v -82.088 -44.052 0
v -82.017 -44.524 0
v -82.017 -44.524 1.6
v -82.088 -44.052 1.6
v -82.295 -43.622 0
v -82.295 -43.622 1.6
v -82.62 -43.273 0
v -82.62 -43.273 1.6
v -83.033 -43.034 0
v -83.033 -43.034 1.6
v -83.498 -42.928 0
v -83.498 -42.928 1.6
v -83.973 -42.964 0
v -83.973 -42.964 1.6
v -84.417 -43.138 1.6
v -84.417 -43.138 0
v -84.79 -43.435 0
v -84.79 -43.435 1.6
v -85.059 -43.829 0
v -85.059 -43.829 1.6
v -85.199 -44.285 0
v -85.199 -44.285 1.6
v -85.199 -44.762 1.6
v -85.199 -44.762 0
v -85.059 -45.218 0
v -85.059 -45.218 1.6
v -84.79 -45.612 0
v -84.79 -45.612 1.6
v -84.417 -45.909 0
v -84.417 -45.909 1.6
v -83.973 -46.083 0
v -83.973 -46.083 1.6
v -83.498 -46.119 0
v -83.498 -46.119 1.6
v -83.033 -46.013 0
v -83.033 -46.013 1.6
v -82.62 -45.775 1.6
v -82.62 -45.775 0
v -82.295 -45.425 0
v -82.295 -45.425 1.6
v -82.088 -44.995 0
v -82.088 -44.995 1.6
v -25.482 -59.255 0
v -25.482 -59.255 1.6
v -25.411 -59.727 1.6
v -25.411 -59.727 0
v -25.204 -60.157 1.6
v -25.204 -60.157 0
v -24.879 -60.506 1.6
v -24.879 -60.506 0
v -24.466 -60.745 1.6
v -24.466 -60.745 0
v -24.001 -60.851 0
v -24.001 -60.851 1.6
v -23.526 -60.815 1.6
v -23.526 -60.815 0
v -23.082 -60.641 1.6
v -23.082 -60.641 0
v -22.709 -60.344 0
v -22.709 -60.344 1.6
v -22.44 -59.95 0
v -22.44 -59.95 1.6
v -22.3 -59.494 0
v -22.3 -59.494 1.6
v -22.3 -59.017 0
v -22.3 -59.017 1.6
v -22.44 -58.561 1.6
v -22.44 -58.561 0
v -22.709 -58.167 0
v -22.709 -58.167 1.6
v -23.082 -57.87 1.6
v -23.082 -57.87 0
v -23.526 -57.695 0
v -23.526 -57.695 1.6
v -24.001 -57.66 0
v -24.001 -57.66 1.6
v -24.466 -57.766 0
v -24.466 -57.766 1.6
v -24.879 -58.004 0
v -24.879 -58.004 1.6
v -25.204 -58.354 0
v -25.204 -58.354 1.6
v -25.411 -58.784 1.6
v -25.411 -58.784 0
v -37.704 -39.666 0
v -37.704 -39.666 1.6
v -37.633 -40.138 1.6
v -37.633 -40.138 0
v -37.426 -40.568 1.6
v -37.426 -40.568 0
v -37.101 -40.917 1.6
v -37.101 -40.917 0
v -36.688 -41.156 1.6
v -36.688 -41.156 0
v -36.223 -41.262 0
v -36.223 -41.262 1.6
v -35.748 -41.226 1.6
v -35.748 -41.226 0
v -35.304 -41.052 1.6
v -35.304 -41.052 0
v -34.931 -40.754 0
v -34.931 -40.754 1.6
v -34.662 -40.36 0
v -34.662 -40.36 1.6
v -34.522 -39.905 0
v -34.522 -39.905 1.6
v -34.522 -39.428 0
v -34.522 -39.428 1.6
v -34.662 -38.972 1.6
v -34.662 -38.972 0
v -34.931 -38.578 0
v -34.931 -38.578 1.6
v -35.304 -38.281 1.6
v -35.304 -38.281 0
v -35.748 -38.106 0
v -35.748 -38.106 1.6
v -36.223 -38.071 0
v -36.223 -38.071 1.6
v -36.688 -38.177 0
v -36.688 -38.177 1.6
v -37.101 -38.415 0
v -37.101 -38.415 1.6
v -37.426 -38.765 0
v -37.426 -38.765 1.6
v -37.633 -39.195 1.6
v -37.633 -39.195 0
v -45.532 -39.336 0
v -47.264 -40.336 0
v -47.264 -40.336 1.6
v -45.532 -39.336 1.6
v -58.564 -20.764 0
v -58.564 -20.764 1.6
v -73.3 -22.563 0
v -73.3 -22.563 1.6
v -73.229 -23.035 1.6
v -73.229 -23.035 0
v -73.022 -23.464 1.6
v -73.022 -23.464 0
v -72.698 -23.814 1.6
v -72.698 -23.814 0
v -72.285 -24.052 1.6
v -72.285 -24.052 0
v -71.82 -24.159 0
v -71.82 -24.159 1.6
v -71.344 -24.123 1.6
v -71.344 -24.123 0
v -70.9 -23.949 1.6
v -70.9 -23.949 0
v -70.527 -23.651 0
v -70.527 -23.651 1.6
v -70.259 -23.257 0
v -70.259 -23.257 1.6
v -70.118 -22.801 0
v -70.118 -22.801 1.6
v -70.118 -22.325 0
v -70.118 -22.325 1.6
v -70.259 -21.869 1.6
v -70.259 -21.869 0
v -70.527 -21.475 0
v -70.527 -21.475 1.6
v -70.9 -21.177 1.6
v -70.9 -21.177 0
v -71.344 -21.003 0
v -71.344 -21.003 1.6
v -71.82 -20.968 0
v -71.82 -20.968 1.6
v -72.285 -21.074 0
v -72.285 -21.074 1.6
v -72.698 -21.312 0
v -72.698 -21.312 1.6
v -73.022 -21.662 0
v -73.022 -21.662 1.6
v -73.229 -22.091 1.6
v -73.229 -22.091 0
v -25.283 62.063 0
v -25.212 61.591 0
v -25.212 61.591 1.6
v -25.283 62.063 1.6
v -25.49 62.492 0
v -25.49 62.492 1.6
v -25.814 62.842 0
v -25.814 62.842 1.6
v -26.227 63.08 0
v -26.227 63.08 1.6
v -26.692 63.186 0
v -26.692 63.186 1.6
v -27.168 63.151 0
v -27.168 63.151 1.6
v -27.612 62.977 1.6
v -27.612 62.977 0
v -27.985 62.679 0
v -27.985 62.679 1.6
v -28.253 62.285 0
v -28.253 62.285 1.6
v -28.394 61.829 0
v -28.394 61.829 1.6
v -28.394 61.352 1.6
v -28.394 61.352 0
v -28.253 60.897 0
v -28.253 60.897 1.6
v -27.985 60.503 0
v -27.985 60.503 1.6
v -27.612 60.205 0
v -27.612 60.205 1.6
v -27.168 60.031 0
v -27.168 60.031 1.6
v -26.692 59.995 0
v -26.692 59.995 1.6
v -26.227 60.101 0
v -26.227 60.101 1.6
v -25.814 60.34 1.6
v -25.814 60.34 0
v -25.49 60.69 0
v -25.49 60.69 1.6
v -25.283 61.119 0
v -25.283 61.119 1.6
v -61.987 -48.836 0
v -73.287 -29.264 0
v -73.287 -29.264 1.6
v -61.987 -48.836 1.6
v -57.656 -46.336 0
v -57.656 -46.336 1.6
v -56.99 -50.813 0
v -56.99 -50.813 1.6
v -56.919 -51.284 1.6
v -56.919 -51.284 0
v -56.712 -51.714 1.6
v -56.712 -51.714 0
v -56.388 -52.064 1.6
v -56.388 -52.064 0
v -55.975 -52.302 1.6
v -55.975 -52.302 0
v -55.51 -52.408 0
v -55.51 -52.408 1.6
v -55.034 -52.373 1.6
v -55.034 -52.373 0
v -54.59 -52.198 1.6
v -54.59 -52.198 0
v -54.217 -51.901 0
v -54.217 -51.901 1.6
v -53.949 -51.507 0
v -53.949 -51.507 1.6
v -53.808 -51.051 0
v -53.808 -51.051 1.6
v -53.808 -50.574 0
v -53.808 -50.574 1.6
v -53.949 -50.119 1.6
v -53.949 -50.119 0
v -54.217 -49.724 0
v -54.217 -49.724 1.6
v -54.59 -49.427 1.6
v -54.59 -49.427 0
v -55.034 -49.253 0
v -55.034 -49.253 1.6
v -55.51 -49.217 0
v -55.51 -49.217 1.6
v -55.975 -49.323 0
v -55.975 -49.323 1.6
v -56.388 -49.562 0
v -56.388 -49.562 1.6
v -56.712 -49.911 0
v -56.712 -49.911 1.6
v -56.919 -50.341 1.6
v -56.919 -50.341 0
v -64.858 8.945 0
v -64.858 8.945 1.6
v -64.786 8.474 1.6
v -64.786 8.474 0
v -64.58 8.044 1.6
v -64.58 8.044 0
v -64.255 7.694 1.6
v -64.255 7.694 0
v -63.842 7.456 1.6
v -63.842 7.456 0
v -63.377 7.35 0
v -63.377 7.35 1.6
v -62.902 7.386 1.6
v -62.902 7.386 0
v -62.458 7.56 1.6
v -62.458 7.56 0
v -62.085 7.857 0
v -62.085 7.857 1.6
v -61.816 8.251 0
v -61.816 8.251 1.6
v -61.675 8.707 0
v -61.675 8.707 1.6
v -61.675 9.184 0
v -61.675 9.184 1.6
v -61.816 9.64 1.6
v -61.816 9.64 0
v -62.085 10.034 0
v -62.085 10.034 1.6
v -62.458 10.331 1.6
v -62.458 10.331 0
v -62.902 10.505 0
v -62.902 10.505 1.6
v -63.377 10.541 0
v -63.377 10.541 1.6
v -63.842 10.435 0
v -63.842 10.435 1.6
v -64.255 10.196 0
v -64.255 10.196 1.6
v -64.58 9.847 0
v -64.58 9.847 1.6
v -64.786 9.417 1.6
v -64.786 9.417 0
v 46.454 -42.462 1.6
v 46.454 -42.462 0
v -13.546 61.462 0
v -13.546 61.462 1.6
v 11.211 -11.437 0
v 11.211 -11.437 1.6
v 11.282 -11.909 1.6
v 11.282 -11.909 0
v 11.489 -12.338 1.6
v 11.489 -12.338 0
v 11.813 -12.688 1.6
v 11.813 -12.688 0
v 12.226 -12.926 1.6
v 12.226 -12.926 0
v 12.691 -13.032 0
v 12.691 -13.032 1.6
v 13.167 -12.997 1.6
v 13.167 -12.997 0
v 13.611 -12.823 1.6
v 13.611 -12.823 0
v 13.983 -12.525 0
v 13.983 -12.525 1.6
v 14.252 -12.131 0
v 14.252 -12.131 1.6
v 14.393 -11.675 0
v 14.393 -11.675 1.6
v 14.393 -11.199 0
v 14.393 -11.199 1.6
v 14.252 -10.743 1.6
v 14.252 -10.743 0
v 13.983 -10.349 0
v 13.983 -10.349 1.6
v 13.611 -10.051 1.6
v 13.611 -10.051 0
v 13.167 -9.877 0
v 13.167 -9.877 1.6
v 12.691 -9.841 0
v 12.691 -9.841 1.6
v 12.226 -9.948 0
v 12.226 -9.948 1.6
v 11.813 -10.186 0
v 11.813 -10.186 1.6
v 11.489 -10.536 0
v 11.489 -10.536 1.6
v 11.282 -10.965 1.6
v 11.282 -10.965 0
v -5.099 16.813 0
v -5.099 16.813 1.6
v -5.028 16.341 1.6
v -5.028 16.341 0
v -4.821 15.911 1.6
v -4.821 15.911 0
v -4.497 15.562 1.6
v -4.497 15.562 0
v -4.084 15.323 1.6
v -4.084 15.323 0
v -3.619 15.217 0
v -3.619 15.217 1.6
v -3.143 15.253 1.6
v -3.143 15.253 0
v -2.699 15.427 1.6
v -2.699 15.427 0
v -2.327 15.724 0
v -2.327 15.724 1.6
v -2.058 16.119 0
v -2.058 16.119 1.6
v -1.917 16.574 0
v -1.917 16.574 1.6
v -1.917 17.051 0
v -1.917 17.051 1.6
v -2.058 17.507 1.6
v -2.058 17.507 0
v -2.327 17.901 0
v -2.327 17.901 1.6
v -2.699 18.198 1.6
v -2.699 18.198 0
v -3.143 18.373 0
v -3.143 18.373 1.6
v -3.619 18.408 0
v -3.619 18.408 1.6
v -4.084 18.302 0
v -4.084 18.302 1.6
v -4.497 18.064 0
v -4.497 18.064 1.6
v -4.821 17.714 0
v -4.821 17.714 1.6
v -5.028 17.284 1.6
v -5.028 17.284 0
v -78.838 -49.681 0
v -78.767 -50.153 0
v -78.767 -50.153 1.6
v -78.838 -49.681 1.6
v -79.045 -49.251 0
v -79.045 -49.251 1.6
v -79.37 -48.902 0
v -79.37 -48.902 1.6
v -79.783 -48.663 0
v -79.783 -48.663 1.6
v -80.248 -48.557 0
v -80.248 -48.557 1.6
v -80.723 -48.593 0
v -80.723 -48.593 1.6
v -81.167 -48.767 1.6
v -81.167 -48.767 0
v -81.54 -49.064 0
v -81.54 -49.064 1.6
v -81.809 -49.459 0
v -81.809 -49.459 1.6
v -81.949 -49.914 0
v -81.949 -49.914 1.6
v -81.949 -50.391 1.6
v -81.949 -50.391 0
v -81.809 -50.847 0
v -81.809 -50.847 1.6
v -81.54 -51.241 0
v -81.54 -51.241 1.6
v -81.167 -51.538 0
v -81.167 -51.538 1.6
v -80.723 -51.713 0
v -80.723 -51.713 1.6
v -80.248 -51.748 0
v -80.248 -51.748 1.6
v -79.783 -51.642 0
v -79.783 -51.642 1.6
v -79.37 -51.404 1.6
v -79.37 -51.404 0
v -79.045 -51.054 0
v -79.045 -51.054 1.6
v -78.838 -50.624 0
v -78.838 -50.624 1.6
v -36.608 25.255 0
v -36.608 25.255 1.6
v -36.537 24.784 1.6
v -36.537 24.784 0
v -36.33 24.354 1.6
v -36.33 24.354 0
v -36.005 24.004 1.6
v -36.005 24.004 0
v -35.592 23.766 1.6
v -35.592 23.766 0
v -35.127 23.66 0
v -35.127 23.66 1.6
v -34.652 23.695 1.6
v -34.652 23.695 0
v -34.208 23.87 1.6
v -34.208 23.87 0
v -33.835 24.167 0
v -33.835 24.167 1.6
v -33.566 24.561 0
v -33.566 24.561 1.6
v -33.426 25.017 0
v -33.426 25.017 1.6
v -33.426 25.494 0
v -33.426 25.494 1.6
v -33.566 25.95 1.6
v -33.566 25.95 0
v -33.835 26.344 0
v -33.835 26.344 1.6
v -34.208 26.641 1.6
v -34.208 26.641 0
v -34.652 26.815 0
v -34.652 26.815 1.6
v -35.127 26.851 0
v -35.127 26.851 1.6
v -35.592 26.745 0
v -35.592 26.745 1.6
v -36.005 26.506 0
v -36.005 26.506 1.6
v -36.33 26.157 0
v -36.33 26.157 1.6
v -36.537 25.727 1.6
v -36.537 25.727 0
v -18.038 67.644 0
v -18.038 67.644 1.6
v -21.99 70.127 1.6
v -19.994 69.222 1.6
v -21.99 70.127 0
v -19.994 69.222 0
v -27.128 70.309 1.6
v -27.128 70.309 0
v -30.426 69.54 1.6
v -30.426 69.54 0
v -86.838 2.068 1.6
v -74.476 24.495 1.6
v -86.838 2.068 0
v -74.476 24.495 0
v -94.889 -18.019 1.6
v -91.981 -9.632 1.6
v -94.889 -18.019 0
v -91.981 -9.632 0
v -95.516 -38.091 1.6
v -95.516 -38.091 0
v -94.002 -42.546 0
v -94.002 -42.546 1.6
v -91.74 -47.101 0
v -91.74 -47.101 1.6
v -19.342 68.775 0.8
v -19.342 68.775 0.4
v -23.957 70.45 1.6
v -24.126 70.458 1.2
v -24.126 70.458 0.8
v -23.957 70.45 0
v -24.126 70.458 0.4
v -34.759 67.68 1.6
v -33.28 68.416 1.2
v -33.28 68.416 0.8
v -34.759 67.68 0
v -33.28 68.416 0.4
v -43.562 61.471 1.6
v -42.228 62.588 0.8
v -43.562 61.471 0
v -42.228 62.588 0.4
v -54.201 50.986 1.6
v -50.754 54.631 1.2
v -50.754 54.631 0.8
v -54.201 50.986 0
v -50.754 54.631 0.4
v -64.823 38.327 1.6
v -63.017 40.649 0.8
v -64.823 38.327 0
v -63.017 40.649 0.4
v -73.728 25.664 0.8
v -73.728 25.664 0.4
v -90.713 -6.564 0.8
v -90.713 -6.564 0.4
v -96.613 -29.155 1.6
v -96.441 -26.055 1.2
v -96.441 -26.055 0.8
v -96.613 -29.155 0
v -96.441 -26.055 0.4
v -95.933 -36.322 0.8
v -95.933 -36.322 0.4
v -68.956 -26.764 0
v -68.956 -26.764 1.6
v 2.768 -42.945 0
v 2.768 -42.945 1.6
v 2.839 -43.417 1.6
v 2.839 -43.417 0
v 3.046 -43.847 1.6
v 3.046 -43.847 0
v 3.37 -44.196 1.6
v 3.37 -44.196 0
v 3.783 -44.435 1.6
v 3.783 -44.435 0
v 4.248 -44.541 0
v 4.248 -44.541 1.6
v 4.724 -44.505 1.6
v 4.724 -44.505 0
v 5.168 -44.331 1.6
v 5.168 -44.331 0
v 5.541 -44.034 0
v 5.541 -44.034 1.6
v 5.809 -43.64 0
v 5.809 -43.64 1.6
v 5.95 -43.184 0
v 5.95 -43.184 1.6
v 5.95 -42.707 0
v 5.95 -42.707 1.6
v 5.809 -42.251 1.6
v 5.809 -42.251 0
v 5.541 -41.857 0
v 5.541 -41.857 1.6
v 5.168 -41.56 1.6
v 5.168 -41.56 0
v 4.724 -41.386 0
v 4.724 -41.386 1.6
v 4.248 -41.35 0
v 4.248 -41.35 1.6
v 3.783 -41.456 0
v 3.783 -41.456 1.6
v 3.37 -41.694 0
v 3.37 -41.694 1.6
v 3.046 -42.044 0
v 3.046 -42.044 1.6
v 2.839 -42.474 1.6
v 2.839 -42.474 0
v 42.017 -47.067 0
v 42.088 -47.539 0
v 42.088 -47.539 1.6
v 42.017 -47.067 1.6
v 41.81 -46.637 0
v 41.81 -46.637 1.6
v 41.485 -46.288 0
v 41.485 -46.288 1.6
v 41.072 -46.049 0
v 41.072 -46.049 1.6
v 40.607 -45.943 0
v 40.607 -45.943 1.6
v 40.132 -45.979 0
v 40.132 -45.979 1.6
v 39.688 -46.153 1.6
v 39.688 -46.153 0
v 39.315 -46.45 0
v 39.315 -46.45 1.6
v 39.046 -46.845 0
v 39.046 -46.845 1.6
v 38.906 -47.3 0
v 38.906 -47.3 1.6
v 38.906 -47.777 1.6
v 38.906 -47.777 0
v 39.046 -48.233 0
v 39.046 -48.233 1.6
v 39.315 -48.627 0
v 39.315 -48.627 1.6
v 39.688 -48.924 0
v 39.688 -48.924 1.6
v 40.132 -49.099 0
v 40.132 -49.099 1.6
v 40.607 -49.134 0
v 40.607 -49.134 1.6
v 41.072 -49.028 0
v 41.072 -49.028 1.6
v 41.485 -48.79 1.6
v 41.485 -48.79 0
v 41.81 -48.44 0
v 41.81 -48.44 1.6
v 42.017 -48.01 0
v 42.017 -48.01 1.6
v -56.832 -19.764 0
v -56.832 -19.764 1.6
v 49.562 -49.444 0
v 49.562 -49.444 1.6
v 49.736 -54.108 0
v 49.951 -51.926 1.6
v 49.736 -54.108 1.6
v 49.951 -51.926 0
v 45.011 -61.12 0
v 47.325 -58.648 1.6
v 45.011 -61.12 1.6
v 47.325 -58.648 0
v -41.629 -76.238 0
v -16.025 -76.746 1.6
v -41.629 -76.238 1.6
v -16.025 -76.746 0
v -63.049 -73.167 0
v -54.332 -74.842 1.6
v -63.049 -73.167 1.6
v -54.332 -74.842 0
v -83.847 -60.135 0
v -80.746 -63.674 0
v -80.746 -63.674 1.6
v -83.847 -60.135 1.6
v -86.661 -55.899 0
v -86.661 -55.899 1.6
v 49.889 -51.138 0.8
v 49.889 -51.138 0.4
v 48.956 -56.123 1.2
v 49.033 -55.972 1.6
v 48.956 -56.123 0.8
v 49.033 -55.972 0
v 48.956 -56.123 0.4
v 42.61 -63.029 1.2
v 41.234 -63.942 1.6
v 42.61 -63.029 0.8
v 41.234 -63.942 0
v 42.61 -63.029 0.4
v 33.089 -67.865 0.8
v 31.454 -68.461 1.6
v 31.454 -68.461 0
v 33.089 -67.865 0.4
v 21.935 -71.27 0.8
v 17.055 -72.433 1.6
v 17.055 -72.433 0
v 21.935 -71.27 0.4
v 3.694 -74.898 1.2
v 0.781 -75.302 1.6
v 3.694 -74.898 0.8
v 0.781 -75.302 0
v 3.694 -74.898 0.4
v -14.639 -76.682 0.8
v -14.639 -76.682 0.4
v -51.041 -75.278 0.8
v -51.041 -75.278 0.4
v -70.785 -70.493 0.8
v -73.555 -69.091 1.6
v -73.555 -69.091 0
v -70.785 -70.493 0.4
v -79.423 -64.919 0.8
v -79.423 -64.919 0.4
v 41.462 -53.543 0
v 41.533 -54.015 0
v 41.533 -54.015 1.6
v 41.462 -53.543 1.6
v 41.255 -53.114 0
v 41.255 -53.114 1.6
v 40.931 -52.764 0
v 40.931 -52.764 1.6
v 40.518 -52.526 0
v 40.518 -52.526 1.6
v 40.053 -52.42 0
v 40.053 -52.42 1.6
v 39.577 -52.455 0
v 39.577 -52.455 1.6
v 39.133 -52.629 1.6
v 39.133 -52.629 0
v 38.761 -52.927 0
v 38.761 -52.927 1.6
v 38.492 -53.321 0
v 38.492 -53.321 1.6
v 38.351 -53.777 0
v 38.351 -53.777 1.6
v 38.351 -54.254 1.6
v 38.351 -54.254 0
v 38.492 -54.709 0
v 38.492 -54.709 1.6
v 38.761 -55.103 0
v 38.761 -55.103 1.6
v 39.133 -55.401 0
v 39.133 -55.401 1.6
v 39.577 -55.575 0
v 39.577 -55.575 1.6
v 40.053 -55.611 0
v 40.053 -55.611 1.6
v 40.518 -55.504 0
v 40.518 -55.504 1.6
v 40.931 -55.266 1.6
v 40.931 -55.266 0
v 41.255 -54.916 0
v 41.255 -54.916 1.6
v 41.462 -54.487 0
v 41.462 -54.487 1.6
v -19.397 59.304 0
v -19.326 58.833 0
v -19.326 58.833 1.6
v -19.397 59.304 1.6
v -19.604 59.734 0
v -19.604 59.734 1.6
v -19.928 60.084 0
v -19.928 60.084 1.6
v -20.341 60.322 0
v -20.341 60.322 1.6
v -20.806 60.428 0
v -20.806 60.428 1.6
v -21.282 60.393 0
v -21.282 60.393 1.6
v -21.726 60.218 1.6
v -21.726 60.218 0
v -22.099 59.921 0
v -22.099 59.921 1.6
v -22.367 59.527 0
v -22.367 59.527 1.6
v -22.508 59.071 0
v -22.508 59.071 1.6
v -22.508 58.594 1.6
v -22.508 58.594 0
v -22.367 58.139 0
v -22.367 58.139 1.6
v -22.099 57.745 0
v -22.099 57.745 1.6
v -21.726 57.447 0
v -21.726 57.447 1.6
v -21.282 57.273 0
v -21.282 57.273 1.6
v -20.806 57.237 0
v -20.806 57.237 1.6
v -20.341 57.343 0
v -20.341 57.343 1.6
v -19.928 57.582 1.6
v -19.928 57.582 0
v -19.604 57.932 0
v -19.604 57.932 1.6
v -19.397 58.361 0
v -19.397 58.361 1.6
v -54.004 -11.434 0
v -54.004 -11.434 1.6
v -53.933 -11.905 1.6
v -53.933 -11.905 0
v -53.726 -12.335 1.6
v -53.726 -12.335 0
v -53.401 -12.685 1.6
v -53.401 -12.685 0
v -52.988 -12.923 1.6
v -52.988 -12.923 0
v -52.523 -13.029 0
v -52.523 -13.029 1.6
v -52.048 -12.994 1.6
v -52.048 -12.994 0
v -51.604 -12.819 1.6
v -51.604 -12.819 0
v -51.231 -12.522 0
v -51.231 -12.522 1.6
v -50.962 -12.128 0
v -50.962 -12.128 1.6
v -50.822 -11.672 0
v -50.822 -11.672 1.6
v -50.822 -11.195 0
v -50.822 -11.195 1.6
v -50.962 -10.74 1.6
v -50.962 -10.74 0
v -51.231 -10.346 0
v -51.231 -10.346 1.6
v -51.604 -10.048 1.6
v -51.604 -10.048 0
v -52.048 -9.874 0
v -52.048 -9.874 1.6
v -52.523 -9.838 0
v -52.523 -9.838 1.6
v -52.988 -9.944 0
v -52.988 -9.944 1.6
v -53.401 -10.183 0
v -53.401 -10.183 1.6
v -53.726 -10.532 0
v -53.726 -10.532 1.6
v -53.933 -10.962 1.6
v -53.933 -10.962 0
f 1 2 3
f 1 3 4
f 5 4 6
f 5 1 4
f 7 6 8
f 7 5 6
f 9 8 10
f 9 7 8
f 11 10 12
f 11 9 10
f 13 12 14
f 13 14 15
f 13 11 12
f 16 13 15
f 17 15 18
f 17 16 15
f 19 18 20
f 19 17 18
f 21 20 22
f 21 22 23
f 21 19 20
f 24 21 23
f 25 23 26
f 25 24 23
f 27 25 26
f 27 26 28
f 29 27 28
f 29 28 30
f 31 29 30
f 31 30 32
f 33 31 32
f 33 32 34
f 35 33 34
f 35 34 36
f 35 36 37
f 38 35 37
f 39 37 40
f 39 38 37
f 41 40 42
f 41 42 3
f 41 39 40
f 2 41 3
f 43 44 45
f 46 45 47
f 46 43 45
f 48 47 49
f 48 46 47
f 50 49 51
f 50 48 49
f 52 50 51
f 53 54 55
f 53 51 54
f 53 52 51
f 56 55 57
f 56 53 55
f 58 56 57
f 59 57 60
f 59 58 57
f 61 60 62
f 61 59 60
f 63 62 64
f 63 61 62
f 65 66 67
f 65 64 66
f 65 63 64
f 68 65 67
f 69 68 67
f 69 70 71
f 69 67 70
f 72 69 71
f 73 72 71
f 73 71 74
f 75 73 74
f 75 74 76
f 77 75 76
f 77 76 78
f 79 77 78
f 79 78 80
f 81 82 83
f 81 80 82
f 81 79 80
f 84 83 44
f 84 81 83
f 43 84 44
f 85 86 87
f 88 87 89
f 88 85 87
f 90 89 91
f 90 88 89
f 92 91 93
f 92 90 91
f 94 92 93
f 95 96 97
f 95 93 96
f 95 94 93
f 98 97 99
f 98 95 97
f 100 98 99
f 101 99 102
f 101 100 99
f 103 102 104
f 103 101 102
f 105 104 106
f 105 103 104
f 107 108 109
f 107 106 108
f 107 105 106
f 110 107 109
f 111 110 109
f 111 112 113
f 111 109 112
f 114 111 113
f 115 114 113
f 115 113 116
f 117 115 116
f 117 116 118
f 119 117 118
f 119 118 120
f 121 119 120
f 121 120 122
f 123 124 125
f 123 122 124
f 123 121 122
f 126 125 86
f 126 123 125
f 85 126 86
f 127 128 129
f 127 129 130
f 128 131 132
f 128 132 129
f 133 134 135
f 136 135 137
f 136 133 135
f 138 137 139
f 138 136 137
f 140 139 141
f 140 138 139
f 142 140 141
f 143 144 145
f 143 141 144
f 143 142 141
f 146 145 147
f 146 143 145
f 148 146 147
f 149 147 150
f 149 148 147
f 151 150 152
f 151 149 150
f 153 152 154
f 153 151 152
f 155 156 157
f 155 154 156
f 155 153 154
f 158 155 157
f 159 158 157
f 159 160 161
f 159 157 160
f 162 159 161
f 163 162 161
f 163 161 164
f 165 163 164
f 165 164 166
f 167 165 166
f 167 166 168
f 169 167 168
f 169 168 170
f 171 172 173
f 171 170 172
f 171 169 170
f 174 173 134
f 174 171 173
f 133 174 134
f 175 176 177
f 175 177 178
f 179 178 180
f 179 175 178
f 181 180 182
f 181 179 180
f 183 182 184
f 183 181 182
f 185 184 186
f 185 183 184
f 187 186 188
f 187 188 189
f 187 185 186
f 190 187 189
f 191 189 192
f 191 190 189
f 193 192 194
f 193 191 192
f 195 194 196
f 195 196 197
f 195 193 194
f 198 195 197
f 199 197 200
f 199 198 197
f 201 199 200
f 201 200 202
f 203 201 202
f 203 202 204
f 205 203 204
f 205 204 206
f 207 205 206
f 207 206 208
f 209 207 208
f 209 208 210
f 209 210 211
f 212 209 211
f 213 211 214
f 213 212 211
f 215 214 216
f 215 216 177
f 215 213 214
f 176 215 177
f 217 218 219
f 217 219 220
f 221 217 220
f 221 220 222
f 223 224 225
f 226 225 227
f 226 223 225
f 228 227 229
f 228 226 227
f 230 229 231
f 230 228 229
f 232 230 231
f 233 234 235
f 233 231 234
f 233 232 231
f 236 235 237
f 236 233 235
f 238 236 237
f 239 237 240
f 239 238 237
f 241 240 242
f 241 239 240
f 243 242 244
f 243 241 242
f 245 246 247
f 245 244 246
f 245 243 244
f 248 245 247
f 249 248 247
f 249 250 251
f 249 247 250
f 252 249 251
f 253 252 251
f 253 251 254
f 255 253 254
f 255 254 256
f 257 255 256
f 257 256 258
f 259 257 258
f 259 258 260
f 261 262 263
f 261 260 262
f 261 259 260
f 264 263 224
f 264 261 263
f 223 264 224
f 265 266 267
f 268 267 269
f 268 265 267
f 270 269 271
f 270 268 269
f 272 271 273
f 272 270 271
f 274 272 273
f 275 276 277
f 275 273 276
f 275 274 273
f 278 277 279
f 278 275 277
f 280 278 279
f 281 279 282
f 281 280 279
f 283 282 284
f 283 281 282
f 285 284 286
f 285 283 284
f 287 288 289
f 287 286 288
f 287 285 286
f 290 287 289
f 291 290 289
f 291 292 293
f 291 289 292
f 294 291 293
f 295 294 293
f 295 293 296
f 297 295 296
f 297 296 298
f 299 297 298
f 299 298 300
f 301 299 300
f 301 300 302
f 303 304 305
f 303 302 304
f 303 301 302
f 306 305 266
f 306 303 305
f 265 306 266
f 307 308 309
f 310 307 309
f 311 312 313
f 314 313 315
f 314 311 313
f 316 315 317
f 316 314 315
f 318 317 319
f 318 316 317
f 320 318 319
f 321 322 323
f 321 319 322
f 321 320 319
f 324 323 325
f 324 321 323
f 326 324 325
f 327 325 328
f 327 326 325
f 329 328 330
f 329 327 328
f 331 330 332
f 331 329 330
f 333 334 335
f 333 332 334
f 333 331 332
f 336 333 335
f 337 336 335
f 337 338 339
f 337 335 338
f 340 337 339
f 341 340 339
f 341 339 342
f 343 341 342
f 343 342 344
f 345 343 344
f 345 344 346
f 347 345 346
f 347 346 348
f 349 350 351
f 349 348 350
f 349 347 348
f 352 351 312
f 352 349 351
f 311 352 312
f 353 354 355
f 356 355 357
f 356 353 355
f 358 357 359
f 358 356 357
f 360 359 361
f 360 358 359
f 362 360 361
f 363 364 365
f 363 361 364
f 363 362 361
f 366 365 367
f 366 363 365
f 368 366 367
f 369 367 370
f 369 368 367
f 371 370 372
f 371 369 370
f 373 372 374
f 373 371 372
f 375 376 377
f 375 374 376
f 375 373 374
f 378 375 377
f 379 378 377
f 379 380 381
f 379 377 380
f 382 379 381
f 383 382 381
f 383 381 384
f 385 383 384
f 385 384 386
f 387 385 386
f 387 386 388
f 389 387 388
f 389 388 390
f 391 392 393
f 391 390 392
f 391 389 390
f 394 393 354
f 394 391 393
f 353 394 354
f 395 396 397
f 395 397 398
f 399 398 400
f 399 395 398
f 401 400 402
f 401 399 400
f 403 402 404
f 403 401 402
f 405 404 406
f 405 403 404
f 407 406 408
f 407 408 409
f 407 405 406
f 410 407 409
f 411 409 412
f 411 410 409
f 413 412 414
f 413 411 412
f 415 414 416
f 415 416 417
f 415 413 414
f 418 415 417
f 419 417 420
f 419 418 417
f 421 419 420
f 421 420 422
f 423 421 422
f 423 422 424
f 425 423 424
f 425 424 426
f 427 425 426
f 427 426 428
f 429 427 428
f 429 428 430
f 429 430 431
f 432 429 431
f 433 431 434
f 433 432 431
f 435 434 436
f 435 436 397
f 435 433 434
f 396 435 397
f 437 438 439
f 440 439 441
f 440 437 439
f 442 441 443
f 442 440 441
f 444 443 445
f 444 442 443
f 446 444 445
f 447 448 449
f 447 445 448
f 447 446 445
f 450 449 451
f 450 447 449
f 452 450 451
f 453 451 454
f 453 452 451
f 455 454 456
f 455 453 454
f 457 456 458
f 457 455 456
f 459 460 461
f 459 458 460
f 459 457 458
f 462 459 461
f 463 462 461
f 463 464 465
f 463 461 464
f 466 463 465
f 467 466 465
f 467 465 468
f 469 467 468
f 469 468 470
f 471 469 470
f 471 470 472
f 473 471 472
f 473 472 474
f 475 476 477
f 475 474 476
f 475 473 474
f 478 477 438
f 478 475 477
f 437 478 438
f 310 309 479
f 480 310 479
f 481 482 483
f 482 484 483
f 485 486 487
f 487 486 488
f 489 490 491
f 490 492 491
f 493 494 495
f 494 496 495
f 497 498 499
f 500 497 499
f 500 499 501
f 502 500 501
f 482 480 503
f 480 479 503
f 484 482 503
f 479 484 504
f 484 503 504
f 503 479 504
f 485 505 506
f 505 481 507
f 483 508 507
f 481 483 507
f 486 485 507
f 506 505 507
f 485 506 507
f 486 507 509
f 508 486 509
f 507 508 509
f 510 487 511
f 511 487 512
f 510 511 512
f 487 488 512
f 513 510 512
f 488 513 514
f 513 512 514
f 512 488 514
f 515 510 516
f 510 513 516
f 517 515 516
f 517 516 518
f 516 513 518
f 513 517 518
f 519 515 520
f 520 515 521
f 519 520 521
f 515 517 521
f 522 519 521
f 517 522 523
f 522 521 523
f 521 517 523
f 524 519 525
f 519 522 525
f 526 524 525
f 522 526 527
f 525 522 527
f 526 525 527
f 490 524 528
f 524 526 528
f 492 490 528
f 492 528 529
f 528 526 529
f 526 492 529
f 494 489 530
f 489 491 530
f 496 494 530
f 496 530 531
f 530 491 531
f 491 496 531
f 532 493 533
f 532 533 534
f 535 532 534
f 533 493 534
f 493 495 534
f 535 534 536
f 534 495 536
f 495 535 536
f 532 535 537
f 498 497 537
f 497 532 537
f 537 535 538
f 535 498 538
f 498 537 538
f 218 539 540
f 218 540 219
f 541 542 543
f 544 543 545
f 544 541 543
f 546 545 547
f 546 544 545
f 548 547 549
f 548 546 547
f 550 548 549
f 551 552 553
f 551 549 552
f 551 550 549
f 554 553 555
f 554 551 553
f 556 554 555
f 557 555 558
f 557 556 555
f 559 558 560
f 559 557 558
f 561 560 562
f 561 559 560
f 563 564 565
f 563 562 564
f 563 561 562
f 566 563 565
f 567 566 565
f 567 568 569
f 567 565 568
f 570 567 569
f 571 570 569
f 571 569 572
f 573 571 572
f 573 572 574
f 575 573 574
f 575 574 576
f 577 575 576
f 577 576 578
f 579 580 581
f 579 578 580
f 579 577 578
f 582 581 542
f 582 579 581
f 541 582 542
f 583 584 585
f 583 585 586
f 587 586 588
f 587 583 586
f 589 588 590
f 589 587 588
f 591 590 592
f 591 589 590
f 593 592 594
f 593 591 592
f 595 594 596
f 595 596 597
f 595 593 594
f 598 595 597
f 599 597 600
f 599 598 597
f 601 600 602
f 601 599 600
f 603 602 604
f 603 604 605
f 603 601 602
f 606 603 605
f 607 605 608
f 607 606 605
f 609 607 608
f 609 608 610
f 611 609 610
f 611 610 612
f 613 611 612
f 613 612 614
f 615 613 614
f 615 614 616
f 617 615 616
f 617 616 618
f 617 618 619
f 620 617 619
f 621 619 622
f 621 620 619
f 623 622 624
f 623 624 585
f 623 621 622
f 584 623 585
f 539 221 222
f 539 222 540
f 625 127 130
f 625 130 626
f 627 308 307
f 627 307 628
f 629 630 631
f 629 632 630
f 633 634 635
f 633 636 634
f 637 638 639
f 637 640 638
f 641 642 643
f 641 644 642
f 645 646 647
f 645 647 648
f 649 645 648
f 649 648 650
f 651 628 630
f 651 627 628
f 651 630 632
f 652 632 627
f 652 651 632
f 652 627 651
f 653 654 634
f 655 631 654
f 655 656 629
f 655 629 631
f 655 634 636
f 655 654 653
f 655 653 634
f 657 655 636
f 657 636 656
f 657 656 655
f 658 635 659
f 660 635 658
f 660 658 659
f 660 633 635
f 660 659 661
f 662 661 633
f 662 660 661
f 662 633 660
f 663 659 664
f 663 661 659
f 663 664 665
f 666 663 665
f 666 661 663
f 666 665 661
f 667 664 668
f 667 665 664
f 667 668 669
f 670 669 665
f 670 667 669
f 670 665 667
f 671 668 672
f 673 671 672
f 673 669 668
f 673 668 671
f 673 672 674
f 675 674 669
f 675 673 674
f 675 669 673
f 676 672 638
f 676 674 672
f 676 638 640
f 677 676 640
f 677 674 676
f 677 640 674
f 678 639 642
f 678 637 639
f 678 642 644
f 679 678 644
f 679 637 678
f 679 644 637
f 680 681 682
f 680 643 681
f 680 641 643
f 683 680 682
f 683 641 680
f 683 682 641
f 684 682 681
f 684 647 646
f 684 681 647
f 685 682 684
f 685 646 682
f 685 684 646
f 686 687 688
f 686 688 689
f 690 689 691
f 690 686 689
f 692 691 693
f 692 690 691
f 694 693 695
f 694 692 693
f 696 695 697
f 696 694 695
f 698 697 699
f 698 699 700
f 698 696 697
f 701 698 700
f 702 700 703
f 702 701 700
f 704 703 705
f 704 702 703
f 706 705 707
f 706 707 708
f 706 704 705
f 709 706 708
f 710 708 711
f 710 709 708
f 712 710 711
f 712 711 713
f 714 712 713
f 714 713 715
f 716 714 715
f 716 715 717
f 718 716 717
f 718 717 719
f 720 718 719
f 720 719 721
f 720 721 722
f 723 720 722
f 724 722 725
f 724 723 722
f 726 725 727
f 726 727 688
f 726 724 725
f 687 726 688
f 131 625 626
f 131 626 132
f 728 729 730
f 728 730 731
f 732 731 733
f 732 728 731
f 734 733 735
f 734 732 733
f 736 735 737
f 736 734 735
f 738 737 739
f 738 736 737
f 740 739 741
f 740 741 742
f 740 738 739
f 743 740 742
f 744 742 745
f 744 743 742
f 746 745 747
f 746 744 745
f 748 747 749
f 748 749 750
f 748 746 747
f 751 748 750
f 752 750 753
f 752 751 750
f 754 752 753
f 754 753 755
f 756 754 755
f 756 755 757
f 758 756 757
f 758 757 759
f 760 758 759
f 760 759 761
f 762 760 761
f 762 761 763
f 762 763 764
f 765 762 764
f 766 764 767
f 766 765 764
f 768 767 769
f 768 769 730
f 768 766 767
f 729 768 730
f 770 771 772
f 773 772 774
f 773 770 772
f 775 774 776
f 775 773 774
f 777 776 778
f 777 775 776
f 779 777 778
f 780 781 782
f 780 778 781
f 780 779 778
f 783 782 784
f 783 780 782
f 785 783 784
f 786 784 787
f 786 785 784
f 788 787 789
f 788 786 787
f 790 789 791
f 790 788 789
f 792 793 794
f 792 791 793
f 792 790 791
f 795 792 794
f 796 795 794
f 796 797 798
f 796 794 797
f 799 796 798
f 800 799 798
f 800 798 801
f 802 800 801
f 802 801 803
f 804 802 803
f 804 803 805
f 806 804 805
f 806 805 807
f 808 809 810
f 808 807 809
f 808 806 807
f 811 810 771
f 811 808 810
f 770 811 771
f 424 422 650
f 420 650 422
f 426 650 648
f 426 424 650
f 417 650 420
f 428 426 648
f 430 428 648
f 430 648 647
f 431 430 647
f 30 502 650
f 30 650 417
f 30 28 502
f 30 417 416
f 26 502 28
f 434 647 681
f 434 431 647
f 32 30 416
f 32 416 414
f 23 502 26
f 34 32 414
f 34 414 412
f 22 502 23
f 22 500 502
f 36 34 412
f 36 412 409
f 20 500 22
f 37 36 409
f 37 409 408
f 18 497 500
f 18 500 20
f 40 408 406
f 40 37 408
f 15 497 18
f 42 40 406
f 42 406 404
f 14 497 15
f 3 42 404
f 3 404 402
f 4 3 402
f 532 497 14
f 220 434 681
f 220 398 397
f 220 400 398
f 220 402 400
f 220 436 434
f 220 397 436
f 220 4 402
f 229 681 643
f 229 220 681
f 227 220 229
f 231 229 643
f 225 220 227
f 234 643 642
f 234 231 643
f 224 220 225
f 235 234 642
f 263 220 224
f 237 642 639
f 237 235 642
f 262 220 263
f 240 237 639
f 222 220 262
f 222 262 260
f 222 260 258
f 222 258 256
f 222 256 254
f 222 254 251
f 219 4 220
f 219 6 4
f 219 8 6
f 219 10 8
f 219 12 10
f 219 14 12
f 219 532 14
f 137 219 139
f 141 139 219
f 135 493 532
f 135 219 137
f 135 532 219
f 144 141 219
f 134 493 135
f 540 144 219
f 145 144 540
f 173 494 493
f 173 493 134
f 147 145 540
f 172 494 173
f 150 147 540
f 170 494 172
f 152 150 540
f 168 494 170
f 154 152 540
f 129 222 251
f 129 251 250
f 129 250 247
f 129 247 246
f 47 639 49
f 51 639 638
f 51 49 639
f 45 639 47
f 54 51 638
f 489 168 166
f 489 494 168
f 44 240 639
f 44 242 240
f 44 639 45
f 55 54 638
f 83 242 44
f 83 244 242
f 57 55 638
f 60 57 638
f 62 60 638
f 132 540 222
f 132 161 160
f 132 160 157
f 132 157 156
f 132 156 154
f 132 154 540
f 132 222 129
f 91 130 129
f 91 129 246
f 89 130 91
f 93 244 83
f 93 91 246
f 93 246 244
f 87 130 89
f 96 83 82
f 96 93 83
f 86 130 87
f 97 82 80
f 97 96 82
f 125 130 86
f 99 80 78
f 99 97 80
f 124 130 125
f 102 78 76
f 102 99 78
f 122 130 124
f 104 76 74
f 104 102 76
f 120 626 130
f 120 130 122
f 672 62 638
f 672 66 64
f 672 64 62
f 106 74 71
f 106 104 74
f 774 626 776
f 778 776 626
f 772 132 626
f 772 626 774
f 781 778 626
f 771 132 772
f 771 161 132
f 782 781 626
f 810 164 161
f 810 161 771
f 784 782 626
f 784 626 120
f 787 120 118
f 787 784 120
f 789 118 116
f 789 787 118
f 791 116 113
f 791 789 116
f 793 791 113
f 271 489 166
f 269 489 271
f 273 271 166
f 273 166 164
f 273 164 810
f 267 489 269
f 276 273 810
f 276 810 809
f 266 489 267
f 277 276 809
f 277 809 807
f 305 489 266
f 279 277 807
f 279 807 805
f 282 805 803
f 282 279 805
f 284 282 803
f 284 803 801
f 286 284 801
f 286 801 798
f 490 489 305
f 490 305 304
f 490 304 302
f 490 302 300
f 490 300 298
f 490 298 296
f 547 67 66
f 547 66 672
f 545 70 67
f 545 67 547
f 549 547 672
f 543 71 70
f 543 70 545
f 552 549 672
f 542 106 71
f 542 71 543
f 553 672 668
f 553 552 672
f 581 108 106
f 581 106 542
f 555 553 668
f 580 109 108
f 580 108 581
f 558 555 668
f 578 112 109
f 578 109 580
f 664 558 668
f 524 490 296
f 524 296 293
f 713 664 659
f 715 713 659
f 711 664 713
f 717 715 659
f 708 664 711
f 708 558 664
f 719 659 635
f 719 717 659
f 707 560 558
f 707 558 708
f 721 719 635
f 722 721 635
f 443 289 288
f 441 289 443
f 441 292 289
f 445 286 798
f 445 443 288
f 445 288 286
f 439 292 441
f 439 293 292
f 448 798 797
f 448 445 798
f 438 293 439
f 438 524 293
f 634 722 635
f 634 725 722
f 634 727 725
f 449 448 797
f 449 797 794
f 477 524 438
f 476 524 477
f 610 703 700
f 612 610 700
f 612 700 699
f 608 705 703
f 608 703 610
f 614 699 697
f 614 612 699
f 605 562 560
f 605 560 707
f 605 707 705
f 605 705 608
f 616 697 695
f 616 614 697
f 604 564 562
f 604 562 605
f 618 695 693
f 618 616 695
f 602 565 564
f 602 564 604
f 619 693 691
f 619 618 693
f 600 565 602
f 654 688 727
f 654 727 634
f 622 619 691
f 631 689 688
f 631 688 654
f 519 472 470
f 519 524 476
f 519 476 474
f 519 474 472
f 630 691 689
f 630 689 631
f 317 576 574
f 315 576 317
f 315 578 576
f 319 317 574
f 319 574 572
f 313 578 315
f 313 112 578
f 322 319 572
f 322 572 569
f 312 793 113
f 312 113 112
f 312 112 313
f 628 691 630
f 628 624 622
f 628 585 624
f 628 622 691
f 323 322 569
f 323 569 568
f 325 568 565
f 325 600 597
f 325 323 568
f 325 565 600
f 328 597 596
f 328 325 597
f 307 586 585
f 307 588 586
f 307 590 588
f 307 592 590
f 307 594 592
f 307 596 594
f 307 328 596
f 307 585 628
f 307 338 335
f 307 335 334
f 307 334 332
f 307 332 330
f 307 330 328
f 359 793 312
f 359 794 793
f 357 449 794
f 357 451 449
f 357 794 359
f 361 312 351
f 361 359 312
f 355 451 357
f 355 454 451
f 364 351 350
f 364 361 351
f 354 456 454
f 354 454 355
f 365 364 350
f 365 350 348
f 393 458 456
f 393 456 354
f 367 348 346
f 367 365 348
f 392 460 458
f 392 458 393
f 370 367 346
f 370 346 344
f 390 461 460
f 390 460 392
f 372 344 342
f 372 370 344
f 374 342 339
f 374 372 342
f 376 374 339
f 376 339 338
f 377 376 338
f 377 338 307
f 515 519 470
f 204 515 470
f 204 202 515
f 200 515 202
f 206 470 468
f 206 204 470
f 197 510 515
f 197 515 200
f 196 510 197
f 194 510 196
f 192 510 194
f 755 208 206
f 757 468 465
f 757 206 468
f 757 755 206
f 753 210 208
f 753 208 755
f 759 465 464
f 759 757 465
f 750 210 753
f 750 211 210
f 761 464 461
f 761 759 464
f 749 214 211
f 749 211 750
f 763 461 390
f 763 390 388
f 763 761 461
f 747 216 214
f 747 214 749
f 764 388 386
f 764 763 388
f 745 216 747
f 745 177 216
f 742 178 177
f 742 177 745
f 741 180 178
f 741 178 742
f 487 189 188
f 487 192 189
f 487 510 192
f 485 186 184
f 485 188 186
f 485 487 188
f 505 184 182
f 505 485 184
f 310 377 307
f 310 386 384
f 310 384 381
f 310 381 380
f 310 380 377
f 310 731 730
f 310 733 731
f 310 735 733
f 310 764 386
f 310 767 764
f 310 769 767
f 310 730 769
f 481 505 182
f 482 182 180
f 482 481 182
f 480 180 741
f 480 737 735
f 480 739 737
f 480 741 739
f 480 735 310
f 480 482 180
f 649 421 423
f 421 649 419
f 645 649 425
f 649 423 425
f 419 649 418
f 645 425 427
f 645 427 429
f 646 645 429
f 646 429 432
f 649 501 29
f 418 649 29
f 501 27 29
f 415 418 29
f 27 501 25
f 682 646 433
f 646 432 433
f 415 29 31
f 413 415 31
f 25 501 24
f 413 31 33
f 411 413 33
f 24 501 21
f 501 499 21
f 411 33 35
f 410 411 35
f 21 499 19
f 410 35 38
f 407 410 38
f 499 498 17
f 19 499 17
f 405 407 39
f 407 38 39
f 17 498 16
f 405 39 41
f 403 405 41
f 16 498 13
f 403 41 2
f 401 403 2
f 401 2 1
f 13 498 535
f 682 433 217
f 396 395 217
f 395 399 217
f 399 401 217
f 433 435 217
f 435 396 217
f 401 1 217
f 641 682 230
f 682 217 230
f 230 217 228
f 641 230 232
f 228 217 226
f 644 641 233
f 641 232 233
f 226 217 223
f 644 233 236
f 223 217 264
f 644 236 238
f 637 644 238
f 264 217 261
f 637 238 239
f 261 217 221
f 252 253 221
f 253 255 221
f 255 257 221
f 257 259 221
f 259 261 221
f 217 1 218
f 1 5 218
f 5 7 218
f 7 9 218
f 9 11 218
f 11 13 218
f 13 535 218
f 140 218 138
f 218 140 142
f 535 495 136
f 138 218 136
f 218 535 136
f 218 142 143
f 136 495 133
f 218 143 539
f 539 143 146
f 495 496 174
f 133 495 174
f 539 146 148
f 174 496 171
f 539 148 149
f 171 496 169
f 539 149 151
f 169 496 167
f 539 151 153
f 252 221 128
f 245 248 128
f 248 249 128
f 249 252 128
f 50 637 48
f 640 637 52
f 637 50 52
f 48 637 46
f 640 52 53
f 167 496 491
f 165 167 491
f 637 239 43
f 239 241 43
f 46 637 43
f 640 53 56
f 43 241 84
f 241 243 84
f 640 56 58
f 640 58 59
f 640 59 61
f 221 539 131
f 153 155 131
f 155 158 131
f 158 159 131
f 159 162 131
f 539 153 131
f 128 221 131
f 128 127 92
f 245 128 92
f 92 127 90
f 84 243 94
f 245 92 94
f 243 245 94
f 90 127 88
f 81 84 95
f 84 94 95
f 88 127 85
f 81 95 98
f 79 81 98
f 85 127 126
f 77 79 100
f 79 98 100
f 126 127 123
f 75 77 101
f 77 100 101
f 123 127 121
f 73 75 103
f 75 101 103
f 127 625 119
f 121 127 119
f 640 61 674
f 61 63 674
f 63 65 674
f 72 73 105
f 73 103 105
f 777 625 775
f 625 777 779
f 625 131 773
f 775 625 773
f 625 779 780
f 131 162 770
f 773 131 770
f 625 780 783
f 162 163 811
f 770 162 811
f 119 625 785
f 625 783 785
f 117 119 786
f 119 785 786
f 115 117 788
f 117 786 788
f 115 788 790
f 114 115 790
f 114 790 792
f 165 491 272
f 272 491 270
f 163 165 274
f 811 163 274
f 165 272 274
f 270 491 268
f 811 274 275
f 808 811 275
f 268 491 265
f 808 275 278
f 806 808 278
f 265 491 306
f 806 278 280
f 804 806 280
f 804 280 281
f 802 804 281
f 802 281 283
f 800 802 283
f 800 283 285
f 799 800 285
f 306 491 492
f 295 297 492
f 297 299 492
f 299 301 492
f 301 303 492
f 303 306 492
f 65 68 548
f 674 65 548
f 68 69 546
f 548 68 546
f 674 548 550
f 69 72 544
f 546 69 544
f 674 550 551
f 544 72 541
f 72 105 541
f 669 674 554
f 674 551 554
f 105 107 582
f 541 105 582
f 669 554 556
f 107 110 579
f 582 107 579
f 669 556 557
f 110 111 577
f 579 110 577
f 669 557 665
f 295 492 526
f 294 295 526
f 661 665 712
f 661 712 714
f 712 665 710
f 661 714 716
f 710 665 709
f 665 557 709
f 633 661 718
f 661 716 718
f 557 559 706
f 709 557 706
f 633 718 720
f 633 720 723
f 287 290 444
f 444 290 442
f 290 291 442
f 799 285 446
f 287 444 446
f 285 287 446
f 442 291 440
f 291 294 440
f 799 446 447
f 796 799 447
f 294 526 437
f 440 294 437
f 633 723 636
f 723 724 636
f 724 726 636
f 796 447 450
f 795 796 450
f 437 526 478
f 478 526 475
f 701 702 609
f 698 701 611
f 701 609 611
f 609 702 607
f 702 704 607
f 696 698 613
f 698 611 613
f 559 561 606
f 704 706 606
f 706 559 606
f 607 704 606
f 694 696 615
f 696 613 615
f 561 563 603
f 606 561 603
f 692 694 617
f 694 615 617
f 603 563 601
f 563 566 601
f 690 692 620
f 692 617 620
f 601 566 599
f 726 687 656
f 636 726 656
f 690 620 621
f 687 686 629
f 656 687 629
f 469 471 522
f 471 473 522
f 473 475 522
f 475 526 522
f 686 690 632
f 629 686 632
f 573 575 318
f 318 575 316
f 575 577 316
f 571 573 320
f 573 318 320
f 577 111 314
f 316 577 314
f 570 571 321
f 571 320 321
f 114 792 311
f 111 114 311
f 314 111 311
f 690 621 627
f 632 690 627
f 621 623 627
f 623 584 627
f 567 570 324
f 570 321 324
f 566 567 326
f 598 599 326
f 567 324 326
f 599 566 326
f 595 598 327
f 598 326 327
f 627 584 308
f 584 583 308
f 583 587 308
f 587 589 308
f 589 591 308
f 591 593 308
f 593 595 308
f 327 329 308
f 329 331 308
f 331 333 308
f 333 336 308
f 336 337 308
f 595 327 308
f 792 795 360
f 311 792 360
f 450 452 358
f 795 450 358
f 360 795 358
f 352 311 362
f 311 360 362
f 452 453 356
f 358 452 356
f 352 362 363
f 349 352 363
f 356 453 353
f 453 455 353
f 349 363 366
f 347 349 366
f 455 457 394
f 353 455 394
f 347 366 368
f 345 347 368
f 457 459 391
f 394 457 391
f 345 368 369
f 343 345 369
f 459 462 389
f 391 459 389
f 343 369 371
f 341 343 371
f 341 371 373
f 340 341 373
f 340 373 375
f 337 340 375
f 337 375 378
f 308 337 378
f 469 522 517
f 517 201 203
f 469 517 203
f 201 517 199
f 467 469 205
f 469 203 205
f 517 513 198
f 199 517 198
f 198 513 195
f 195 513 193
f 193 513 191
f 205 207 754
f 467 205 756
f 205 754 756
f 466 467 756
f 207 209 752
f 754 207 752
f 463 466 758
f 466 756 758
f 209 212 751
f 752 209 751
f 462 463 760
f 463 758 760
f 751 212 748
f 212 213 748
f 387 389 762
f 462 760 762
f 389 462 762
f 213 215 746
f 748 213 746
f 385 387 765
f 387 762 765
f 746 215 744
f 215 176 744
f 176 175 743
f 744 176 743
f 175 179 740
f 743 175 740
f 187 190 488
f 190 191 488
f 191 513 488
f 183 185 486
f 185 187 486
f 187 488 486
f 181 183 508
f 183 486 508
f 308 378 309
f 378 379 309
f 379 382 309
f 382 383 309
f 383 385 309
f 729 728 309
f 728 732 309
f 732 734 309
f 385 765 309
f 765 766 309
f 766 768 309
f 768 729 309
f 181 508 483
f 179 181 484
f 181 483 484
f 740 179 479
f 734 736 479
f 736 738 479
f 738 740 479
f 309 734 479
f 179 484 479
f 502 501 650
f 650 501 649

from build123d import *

# Parameters (mm, degrees)
SKETCH1_R         = 1.6
PLATE_DEPTH       = 1.6
MAST_REACH        = 125.511
SKETCH5_R         = 1.6
FLEX_SLOT_REACH   = 125.511
FLEX_SCREWS_REACH = 125.511
SKETCH8_R         = 1.6


with BuildPart() as part:
    # Sketch1 → Plate (new body)
    with BuildSketch(Plane.XY):
        with BuildLine():
            Line((-91.74011313, -47.101462966), (-86.661120049, -55.898537034))
            add(Edge.make_bspline(
                [(46.454482672, -42.461524227), (51.012463207, -50.356178094), (48.363057384, -62.963074023), (9.351058761, -77.00992556), (-41.227325625, -78.712130765), (-78.13483155, -70.666501915), (-86.661120049, -55.898537034)],
                knots=[0, 0, 0, 0, 0.073999004, 0.28665872, 0.740794667, 1, 1, 1, 1], degree=3))
            Line((46.454482672, -42.461524227), (-13.545517328, 61.461524227))
            add(Edge.make_bspline(
                [(-13.545517328, 61.461524227), (-18.103497863, 69.356178094), (-30.346092912, 73.365173311), (-62.017022498, 46.603217219), (-88.780367641, 3.652154061), (-100.26640163, -32.333498085), (-91.74011313, -47.101462966)],
                knots=[0, 0, 0, 0, 0.073999004, 0.28665872, 0.740794667, 1, 1, 1, 1], degree=3))
        make_face()
        with Locations((-26.811674635, 61.590895552)):
            Circle(SKETCH1_R, mode=Mode.SUBTRACT)
        with Locations((-20.925837478, 58.832830838)):
            Circle(SKETCH1_R, mode=Mode.SUBTRACT)
        with Locations((-83.617134672, -44.523598462)):
            Circle(SKETCH1_R, mode=Mode.SUBTRACT)
        with Locations((-80.367134672, -50.152763587)):
            Circle(SKETCH1_R, mode=Mode.SUBTRACT)
        with Locations((40.487807343, -47.53872227)):
            Circle(SKETCH1_R, mode=Mode.SUBTRACT)
        with Locations((39.933442873, -54.015039128)):
            Circle(SKETCH1_R, mode=Mode.SUBTRACT)
    extrude(amount=PLATE_DEPTH)

    # Sketch5 → Mast (cut, up to next)
    with BuildSketch(Plane.XY, mode=Mode.PRIVATE) as mast_sk1:
        with Locations(Location((-35.007890041, 25.255379992, 0), (0, 0, 180))):
            Circle(SKETCH5_R)
    mast_tool1 = extrude(mast_sk1.sketch, amount=MAST_REACH, mode=Mode.PRIVATE) & part.part
    # Sketch5 → Mast (cut, up to next)
    with BuildSketch(Plane.XY, mode=Mode.PRIVATE) as mast_sk2:
        with Locations(Location((-55.390275833, -50.812719363, 0), (0, 0, 180))):
            Circle(SKETCH5_R)
    mast_tool2 = extrude(mast_sk2.sketch, amount=MAST_REACH, mode=Mode.PRIVATE) & part.part
    # Sketch5 → Mast (cut, up to next)
    with BuildSketch(Plane.XY, mode=Mode.PRIVATE) as mast_sk3:
        with Locations(Location((-3.499451624, 16.812719363, 0), (0, 0, 180))):
            Circle(SKETCH5_R)
    mast_tool3 = extrude(mast_sk3.sketch, amount=MAST_REACH, mode=Mode.PRIVATE) & part.part
    # Sketch5 → Mast (cut, up to next)
    with BuildSketch(Plane.XY, mode=Mode.PRIVATE) as mast_sk4:
        with Locations(Location((12.810516263, -11.436973688, 0), (0, 0, 180))):
            Circle(SKETCH5_R)
    mast_tool4 = extrude(mast_sk4.sketch, amount=MAST_REACH, mode=Mode.PRIVATE) & part.part
    # Sketch5 → Mast (cut, up to next)
    with BuildSketch(Plane.XY, mode=Mode.PRIVATE) as mast_sk5:
        with Locations(Location((4.367855635, -42.945412104, 0), (0, 0, 180))):
            Circle(SKETCH5_R)
    mast_tool5 = extrude(mast_sk5.sketch, amount=MAST_REACH, mode=Mode.PRIVATE) & part.part
    # Sketch5 → Mast (cut, up to next)
    with BuildSketch(Plane.XY, mode=Mode.PRIVATE) as mast_sk6:
        with Locations(Location((-23.881837416, -59.255379992, 0), (0, 0, 180))):
            Circle(SKETCH5_R)
    mast_tool6 = extrude(mast_sk6.sketch, amount=MAST_REACH, mode=Mode.PRIVATE) & part.part
    # Sketch5 → Mast (cut, up to next)
    with BuildSketch(Plane.XY, mode=Mode.PRIVATE) as mast_sk7:
        with Locations(Location((-71.70024372, -22.563026312, 0), (0, 0, 180))):
            Circle(SKETCH5_R)
    mast_tool7 = extrude(mast_sk7.sketch, amount=MAST_REACH, mode=Mode.PRIVATE) & part.part
    # Sketch5 → Mast (cut, up to next)
    with BuildSketch(Plane.XY, mode=Mode.PRIVATE) as mast_sk8:
        with Locations(Location((-63.257583092, 8.945412104, 0), (0, 0, 180))):
            Circle(SKETCH5_R)
    mast_tool8 = extrude(mast_sk8.sketch, amount=MAST_REACH, mode=Mode.PRIVATE) & part.part
    add(mast_tool1.solids().sort_by_distance((-35.00789, 25.25538, 0))[0], mode=Mode.SUBTRACT)
    add(mast_tool2.solids().sort_by_distance((-55.390276, -50.812719, 0))[0], mode=Mode.SUBTRACT)
    add(mast_tool3.solids().sort_by_distance((-3.499452, 16.812719, 0))[0], mode=Mode.SUBTRACT)
    add(mast_tool4.solids().sort_by_distance((12.810516, -11.436974, 0))[0], mode=Mode.SUBTRACT)
    add(mast_tool5.solids().sort_by_distance((4.367856, -42.945412, 0))[0], mode=Mode.SUBTRACT)
    add(mast_tool6.solids().sort_by_distance((-23.881837, -59.25538, 0))[0], mode=Mode.SUBTRACT)
    add(mast_tool7.solids().sort_by_distance((-71.700244, -22.563026, 0))[0], mode=Mode.SUBTRACT)
    add(mast_tool8.solids().sort_by_distance((-63.257583, 8.945412, 0))[0], mode=Mode.SUBTRACT)

    # Sketch6 → Flex slot (cut, up to next)
    with BuildSketch(Plane.XY, mode=Mode.PRIVATE) as flex_slot_sk1:
        Polygon((-57.656457017, -46.336087063), (-68.956457017, -26.763912937), (-73.286584036, -29.263912937), (-61.986584036, -48.836087063), align=None)
    flex_slot_tool1 = extrude(flex_slot_sk1.sketch, amount=FLEX_SLOT_REACH, mode=Mode.PRIVATE) & part.part
    # Sketch6 → Flex slot (cut, up to next)
    with BuildSketch(Plane.XY, mode=Mode.PRIVATE) as flex_slot_sk2:
        Polygon((-56.832101364, -19.763912937), (-58.564152171, -20.763912937), (-47.264152171, -40.336087063), (-45.532101364, -39.336087063), align=None)
    flex_slot_tool2 = extrude(flex_slot_sk2.sketch, amount=FLEX_SLOT_REACH, mode=Mode.PRIVATE) & part.part
    add(flex_slot_tool1.solids().sort_by_distance((-65.471521, -37.8, 0))[0], mode=Mode.SUBTRACT)
    add(flex_slot_tool2.solids().sort_by_distance((-52.048127, -30.05, 0))[0], mode=Mode.SUBTRACT)

    # Sketch8 → Flex screws (cut, up to next)
    with BuildSketch(Plane.XY, mode=Mode.PRIVATE) as flex_screws_sk1:
        with Locations(Location((-36.103898133, -39.666214082, 0), (0, 0, 180))):
            Circle(SKETCH8_R)
    flex_screws_tool1 = extrude(flex_screws_sk1.sketch, amount=FLEX_SCREWS_REACH, mode=Mode.PRIVATE) & part.part
    # Sketch8 → Flex screws (cut, up to next)
    with BuildSketch(Plane.XY, mode=Mode.PRIVATE) as flex_screws_sk2:
        with Locations(Location((-52.403898133, -11.433785918, 0), (0, 0, 180))):
            Circle(SKETCH8_R)
    flex_screws_tool2 = extrude(flex_screws_sk2.sketch, amount=FLEX_SCREWS_REACH, mode=Mode.PRIVATE) & part.part
    add(flex_screws_tool1.solids().sort_by_distance((-36.103898, -39.666214, 0))[0], mode=Mode.SUBTRACT)
    add(flex_screws_tool2.solids().sort_by_distance((-52.403898, -11.433786, 0))[0], mode=Mode.SUBTRACT)


solid = part.part
